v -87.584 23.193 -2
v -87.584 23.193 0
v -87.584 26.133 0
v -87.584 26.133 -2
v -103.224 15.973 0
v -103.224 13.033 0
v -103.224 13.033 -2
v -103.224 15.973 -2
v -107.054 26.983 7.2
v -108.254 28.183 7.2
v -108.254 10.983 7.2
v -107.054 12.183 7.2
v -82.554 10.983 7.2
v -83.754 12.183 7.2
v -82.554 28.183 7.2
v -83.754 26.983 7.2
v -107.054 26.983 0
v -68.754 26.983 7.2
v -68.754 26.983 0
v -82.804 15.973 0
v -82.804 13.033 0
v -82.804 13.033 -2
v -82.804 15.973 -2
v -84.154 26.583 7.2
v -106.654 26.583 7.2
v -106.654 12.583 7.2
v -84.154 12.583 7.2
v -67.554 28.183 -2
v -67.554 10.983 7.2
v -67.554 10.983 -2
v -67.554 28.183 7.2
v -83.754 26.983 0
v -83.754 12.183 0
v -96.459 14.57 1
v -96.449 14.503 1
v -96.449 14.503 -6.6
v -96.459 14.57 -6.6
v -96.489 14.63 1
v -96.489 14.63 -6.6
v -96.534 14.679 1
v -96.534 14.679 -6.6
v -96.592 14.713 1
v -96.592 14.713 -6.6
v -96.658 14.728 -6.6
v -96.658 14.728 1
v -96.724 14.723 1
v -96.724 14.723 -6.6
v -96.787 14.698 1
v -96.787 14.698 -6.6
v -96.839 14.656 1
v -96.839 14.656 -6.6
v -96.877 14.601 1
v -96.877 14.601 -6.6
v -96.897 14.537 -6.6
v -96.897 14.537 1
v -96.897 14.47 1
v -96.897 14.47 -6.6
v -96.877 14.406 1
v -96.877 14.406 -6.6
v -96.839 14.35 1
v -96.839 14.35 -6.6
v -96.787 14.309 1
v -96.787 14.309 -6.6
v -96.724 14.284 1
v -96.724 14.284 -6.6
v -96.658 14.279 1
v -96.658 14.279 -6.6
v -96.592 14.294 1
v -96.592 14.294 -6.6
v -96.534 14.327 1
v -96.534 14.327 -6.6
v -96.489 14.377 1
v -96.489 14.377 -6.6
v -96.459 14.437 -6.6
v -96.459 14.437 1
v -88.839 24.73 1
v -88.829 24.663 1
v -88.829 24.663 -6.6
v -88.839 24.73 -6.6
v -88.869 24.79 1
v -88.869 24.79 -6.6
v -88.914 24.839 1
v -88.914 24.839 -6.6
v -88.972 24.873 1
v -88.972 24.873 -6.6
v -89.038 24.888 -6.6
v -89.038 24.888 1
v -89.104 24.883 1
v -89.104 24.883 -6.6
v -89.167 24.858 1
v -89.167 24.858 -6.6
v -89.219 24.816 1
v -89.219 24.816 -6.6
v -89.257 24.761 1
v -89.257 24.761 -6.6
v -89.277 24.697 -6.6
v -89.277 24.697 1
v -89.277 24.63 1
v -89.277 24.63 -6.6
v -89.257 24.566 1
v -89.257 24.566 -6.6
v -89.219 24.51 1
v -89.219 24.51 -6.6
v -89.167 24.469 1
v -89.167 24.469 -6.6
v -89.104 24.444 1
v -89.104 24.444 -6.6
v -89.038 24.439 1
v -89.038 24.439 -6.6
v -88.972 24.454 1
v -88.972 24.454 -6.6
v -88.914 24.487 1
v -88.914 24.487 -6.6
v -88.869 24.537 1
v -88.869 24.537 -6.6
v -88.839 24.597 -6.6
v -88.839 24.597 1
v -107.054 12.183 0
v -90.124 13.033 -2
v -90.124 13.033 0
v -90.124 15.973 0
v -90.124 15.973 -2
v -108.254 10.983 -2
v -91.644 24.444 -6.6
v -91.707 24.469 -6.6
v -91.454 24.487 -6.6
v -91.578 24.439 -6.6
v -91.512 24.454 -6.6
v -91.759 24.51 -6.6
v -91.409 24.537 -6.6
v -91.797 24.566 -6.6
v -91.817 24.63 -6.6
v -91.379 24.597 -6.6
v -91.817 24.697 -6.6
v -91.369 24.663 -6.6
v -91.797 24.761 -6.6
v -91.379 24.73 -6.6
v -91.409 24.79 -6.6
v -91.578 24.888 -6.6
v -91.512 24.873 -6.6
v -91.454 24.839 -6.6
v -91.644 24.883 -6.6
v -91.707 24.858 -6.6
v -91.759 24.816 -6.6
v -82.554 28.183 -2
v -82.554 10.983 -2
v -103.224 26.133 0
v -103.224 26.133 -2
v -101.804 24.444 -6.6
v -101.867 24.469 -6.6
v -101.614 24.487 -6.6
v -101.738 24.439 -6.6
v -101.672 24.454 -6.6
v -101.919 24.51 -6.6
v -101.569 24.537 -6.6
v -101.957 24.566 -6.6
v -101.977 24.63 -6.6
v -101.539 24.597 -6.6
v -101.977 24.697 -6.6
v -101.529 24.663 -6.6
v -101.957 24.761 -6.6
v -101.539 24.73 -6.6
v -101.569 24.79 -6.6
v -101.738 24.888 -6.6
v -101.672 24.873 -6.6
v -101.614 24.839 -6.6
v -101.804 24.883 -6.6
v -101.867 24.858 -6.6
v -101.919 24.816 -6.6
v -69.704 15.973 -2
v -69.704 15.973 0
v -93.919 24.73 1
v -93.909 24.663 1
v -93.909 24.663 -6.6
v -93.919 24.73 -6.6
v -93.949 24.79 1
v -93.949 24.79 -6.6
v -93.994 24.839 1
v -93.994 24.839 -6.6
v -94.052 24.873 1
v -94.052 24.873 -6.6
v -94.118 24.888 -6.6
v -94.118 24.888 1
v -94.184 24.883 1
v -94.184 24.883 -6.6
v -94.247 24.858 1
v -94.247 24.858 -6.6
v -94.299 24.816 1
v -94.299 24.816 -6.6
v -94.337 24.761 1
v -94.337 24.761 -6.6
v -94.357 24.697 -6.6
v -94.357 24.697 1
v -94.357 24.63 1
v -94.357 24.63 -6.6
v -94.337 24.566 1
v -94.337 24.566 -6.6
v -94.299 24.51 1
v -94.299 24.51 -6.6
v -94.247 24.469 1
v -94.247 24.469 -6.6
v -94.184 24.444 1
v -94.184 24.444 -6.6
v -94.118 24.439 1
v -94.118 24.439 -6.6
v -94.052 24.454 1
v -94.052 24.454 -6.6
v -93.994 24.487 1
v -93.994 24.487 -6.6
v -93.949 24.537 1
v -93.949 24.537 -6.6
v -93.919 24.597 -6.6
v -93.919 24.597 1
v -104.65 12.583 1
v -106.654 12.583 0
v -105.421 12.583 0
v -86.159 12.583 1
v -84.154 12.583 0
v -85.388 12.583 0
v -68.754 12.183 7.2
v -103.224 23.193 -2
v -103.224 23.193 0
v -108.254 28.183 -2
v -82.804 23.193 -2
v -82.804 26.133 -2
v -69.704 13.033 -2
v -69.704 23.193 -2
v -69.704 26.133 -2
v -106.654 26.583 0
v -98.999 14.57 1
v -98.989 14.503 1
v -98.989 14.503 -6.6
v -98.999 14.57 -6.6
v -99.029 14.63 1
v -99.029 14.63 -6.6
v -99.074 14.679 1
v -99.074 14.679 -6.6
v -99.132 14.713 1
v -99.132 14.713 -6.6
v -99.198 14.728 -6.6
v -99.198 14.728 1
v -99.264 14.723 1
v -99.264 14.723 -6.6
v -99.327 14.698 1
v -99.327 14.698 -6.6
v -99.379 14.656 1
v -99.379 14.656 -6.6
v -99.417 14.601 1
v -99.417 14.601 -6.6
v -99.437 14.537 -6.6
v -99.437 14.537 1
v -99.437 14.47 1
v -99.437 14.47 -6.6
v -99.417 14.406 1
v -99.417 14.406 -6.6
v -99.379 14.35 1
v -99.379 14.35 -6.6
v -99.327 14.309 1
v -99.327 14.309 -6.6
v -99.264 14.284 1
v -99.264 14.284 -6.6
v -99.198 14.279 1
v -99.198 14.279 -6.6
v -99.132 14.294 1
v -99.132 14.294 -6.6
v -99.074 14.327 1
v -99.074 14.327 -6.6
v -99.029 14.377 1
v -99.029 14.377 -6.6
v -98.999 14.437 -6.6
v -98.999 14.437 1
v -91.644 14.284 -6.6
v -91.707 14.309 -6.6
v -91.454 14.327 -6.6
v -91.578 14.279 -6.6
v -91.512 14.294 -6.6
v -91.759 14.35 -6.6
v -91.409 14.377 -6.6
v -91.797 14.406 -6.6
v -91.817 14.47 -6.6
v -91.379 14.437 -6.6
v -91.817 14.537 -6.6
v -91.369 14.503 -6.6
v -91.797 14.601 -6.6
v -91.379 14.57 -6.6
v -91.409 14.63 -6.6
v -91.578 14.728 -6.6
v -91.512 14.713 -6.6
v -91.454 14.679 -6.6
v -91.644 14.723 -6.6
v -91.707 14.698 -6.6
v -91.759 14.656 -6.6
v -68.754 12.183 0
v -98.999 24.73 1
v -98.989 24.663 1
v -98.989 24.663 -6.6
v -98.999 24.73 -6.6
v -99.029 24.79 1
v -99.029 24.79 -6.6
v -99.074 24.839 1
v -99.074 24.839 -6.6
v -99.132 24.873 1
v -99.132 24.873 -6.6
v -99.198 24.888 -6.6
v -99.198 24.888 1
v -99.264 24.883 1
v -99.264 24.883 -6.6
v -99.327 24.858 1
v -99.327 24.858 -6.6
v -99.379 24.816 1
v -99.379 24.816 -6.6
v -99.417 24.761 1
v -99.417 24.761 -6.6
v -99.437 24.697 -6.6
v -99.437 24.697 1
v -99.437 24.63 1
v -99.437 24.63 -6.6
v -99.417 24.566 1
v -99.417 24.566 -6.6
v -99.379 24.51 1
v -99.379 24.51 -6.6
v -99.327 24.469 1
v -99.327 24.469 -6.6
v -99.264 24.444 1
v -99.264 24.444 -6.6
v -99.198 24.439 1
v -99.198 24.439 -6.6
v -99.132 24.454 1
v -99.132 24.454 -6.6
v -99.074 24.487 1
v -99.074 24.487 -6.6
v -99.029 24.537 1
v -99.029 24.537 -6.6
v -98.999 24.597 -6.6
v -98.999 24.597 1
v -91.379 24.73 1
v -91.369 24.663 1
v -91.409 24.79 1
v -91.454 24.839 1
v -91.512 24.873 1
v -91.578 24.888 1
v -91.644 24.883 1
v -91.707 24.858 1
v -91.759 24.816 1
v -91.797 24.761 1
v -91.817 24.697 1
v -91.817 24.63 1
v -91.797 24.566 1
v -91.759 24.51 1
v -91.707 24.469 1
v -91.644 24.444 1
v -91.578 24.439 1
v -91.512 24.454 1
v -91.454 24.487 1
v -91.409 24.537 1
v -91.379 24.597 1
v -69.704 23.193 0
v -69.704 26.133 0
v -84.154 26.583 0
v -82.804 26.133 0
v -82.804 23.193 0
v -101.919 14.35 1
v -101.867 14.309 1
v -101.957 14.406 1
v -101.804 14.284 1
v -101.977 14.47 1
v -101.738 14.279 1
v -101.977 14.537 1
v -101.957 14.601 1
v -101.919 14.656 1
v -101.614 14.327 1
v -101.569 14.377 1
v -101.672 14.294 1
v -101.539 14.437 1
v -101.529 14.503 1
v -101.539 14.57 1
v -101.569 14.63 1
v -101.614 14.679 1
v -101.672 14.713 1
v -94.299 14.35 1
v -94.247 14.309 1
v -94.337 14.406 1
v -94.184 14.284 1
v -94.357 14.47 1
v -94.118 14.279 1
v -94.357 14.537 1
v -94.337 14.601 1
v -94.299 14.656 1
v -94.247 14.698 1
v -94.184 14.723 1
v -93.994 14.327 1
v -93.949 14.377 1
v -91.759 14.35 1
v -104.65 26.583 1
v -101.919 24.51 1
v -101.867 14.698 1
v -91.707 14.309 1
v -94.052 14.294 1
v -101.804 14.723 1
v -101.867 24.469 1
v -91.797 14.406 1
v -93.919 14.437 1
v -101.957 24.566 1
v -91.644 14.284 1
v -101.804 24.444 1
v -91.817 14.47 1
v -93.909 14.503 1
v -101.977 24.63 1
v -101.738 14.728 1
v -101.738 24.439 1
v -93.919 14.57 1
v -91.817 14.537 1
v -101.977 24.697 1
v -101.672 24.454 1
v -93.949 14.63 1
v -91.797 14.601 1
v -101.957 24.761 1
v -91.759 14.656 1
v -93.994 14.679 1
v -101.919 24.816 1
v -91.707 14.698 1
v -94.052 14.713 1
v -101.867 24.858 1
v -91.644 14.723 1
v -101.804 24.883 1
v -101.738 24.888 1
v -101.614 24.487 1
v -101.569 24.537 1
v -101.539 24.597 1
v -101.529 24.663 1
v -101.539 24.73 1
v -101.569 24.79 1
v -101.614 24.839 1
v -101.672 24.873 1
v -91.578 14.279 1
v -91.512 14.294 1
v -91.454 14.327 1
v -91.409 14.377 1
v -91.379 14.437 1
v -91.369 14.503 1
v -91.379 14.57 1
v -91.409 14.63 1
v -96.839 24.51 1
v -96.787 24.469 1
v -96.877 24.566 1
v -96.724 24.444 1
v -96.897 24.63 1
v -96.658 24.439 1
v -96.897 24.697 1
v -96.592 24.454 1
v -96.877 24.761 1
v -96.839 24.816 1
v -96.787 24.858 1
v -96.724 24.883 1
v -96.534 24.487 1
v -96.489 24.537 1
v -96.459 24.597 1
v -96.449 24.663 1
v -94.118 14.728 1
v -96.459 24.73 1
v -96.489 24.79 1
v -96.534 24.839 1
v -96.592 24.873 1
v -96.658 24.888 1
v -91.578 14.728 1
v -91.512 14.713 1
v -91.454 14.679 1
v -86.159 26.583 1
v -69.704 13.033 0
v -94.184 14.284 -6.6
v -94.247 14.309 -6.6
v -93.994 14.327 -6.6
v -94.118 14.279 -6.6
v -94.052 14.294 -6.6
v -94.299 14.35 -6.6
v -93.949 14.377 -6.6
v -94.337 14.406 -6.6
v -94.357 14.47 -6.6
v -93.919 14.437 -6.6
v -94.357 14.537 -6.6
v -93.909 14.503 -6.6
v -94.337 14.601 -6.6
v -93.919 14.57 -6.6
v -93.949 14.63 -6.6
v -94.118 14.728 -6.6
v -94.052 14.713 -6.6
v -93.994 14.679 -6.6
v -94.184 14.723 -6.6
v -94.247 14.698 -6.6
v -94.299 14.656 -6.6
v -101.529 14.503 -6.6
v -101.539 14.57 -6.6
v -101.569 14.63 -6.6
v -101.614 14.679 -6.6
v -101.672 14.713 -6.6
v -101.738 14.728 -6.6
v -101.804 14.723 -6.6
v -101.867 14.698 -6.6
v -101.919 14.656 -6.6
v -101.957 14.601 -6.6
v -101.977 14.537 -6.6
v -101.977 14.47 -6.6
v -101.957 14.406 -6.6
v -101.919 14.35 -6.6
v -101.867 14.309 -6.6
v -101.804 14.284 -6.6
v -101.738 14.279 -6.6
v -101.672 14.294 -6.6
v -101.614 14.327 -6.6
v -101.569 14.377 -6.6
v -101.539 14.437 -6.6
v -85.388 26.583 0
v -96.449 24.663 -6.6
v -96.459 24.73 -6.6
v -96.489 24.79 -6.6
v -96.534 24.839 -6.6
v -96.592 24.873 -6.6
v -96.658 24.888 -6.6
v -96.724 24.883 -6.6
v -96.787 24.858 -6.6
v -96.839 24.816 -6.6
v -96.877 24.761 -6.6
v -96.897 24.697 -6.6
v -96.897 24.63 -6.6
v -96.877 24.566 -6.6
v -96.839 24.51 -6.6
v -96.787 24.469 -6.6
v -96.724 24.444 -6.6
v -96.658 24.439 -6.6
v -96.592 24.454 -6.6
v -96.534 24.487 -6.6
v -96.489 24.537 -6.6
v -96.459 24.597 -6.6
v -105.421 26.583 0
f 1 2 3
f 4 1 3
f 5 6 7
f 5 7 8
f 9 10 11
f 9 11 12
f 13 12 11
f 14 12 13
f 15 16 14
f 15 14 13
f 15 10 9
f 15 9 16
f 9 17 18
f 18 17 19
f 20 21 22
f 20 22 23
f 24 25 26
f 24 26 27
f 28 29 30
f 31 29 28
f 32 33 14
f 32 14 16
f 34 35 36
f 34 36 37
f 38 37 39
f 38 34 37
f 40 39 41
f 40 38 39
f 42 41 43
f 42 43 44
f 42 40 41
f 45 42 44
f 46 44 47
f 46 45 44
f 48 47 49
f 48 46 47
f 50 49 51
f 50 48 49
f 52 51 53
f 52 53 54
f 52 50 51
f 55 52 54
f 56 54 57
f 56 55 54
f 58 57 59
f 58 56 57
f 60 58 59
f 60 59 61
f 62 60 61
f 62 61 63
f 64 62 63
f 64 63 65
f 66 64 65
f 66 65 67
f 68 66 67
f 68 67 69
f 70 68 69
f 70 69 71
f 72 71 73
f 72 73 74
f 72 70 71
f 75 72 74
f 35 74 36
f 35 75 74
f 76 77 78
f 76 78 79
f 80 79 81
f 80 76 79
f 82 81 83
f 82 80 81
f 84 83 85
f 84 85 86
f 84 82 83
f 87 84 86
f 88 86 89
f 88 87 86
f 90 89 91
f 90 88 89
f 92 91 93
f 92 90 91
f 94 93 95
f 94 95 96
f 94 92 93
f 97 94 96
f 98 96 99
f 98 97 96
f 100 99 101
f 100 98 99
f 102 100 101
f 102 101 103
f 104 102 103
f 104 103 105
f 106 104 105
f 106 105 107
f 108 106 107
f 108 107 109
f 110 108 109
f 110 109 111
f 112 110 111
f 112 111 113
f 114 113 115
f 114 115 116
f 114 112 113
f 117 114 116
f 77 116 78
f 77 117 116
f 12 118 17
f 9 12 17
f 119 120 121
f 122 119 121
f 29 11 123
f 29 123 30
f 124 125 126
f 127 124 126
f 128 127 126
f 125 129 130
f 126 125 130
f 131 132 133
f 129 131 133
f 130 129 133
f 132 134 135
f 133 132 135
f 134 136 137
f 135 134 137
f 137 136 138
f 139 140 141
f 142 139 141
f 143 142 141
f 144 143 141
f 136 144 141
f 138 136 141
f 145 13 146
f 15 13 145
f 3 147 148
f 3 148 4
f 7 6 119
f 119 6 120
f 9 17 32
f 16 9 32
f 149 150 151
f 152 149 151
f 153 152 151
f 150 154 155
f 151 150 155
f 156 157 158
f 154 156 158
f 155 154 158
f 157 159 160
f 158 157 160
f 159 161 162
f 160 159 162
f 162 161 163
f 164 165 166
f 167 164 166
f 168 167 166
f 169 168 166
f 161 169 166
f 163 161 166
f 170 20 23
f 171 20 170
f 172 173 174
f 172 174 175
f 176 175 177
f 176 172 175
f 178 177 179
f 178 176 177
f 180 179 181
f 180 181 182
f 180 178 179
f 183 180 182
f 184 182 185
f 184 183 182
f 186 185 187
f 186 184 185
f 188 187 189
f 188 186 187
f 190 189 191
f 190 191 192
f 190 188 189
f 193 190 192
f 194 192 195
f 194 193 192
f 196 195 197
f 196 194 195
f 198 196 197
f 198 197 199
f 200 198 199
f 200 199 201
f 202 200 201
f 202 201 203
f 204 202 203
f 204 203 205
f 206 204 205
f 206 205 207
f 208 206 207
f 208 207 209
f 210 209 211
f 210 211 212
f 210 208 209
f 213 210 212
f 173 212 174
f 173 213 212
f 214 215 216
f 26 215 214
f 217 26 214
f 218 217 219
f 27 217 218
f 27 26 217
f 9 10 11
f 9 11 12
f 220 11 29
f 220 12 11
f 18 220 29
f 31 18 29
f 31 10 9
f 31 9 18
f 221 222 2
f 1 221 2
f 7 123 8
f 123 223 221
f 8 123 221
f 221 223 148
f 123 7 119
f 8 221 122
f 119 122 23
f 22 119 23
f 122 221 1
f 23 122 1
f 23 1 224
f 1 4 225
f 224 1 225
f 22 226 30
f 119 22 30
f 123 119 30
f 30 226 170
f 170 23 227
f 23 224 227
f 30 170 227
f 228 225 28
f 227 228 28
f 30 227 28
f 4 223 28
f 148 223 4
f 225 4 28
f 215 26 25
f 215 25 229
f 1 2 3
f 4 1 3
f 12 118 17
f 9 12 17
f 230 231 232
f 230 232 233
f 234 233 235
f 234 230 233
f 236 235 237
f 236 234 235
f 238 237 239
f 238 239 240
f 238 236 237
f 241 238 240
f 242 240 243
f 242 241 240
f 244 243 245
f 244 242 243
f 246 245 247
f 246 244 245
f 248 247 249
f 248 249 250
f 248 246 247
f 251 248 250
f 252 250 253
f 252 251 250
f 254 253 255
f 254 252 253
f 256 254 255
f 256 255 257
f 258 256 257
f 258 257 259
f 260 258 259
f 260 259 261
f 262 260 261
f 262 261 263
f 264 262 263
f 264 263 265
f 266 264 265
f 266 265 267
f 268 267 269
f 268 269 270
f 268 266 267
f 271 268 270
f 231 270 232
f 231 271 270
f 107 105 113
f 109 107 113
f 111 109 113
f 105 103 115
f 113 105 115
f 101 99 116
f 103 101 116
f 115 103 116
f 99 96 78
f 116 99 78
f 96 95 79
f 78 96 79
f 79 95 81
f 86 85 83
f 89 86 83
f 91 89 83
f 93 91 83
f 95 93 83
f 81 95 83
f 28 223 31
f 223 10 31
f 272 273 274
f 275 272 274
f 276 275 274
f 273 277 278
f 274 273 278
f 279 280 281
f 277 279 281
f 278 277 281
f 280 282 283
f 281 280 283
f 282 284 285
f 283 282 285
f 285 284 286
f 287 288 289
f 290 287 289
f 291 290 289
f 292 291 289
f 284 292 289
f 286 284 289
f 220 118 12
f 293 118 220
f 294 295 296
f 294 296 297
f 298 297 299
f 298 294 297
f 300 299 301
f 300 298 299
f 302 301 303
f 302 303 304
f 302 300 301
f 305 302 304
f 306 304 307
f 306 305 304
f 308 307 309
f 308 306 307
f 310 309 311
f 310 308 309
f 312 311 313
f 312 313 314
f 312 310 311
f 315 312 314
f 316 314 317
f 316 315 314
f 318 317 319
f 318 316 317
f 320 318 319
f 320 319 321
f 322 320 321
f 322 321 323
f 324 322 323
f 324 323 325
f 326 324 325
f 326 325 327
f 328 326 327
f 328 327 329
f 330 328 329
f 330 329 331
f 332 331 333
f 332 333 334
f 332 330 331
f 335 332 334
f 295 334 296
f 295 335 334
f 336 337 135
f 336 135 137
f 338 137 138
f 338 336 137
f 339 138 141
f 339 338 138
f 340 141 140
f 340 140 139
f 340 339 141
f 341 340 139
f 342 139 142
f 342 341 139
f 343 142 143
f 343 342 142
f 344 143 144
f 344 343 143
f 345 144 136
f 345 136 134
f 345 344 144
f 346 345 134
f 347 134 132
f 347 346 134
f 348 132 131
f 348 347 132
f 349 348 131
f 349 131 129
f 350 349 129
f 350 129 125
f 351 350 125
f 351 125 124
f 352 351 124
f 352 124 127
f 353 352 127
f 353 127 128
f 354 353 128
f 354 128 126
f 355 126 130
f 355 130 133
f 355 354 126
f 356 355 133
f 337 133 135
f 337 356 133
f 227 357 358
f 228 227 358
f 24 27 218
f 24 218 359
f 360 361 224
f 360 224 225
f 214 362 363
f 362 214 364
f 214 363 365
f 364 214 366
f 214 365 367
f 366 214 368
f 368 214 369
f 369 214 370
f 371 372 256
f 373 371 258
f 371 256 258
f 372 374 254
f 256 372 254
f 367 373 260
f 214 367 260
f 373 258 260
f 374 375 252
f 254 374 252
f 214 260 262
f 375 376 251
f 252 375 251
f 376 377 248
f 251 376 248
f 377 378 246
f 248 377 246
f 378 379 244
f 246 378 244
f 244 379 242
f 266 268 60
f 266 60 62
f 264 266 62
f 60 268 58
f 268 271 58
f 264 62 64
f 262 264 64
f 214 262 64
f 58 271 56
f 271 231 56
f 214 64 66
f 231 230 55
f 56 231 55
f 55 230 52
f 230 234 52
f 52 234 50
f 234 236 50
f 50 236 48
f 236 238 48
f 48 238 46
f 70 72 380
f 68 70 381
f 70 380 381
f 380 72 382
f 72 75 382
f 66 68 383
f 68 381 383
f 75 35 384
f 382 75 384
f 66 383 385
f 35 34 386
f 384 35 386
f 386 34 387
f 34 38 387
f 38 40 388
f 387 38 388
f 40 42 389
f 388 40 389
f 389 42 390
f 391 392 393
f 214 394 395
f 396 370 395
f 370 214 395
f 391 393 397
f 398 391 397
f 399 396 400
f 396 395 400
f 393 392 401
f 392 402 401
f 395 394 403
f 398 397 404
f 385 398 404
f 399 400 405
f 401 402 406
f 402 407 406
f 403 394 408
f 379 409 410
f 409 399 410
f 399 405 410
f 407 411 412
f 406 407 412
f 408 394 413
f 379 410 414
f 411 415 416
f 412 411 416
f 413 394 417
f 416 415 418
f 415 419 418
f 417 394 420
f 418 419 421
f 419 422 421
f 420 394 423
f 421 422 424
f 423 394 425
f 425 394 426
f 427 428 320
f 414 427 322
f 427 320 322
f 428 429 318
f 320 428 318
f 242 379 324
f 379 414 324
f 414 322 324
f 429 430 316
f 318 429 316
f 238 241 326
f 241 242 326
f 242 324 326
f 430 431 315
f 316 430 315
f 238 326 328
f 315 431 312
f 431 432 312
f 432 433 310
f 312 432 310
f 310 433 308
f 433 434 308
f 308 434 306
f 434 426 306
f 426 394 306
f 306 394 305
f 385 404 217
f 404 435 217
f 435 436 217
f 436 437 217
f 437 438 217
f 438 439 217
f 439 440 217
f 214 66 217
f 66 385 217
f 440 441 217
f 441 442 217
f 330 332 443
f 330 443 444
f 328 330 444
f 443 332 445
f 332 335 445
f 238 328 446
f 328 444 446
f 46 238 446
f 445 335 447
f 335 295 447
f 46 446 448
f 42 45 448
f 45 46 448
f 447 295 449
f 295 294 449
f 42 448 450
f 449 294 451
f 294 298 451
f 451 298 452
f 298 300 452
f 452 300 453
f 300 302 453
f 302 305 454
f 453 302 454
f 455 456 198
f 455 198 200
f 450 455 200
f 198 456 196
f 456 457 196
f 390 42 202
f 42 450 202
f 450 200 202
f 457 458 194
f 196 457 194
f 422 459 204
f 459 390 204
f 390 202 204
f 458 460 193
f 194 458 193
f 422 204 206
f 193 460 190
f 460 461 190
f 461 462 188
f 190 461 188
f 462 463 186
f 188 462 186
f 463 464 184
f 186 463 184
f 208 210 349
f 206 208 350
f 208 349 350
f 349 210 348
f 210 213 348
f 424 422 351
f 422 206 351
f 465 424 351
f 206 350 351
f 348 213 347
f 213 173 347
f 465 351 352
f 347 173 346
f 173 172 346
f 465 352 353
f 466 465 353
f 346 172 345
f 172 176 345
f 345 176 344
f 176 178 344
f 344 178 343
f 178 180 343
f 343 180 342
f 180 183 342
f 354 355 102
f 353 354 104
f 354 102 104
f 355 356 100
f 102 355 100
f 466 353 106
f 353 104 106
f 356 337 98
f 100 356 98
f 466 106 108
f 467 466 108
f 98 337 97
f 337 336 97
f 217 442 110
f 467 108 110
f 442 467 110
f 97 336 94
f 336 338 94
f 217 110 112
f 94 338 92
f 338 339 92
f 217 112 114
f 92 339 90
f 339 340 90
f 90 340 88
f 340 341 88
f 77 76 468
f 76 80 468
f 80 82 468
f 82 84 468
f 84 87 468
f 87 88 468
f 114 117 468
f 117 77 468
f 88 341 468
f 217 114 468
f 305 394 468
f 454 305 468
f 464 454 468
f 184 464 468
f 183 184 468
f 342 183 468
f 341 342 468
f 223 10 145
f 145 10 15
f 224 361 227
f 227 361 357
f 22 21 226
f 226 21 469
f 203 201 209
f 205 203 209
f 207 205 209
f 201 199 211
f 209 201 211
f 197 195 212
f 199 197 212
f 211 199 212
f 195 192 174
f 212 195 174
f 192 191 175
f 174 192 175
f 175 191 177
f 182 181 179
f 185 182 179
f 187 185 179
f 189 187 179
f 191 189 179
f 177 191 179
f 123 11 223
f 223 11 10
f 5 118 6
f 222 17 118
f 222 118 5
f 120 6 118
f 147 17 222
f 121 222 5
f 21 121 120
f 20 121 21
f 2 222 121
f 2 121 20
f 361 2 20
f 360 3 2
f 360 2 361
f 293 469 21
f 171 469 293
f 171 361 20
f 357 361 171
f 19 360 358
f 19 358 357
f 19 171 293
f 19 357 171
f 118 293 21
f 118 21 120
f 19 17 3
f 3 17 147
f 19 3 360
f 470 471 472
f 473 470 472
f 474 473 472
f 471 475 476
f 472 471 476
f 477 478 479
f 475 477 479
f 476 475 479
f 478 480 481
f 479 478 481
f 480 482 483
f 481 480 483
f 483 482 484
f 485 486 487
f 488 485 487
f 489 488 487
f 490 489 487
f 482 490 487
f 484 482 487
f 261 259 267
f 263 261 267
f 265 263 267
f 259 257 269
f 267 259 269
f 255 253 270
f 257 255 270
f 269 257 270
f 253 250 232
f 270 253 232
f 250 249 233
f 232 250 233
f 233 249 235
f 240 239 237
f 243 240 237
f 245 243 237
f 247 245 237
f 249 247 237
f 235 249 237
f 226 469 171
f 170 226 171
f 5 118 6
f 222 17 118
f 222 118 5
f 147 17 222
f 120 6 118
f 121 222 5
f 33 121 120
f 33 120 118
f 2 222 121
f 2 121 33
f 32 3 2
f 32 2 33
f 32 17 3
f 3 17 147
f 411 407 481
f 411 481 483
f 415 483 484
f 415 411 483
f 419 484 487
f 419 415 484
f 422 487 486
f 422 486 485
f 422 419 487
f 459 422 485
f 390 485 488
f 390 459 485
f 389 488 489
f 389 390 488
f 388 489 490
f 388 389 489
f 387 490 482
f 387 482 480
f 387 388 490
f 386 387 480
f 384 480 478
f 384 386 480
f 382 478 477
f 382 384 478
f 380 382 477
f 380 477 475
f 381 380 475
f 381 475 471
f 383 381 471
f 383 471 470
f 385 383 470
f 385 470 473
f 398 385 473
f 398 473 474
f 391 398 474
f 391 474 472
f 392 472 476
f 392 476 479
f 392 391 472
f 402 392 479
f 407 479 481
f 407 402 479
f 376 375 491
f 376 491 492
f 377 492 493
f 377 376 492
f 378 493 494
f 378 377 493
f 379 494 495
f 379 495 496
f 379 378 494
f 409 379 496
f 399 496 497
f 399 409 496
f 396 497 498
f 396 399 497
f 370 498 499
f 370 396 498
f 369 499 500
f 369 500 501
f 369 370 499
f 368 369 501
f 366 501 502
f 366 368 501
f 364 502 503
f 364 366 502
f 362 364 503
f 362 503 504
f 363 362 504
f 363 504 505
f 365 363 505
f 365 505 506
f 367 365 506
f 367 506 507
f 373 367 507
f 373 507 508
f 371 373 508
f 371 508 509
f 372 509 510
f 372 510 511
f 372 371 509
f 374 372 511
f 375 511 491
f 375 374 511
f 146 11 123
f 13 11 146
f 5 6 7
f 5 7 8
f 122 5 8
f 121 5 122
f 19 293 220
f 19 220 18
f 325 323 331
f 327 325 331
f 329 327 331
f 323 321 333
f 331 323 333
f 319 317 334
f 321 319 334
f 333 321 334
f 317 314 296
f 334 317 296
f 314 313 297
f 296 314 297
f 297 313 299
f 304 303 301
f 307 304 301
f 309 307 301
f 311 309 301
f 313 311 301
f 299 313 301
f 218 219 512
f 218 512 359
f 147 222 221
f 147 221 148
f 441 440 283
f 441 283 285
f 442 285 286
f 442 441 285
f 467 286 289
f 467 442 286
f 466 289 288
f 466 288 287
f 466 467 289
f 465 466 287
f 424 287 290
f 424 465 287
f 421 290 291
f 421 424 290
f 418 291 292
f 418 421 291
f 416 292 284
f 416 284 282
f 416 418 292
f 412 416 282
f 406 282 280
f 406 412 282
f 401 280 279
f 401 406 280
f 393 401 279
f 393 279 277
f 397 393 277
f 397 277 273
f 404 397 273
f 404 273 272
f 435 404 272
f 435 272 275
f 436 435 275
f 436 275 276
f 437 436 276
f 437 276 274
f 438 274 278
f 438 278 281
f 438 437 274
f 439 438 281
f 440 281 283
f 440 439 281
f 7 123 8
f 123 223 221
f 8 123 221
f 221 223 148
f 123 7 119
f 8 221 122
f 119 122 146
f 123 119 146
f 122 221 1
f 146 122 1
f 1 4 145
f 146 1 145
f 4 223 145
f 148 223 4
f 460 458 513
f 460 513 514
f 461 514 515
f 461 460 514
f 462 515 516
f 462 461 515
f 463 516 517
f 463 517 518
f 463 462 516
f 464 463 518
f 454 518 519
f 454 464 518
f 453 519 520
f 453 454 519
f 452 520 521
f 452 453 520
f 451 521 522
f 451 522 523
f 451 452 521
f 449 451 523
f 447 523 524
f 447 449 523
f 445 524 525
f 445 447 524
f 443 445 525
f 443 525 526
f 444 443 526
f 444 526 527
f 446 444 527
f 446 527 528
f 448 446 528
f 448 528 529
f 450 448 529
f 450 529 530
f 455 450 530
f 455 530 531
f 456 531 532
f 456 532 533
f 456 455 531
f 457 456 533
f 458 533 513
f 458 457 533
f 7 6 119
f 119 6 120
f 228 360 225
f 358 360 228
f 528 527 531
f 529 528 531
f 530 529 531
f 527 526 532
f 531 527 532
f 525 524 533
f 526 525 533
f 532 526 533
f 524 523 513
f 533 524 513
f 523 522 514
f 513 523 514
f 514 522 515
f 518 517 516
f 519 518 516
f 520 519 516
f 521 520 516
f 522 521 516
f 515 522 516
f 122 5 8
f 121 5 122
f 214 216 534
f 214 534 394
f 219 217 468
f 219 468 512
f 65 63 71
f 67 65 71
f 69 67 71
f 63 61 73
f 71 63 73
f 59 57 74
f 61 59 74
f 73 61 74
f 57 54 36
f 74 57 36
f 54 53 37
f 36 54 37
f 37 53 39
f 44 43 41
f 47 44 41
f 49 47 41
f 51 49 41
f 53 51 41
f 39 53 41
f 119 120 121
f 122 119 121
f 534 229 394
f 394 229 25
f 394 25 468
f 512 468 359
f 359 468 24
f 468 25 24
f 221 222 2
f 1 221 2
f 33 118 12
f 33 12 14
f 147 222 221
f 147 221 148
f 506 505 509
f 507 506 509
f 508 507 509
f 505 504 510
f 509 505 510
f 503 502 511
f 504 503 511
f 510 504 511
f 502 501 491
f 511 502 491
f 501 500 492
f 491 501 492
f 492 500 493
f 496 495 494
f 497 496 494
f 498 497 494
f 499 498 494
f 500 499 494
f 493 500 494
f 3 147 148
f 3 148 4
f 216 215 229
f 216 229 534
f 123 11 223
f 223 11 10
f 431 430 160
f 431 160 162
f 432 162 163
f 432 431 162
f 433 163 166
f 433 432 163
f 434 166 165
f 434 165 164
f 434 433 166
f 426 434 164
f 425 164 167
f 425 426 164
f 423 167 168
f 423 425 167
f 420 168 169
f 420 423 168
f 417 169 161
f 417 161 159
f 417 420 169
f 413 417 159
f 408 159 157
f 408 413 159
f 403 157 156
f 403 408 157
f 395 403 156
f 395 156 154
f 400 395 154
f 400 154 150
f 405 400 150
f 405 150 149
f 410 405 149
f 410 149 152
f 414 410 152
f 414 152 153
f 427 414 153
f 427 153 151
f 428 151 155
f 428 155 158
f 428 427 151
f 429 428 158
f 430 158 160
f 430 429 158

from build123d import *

# Parameters (mm, degrees)
F4_W      = 22.5
F4_H      = 14
F6_DEPTH  = 6.2
F5_R      = 0.225
F7_DEPTH  = 7.6
F10_DEPTH = 14
F11_W     = 25.7
F11_H     = 17.2
F11_W_2   = 23.3
F11_H_2   = 14.8
F12_DEPTH = 7.2
F11_W_3   = 13.1
F11_H_3   = 2.94
F11_W_4   = 15.64
F13_DEPTH = 2
F14_W     = 40.7
F14_H     = 17.2
F14_W_2   = 38.3
F14_H_2   = 14.8
F15_DEPTH = 7.2
F14_W_3   = 13.1
F14_H_3   = 2.94
F14_W_4   = 15.64
F16_DEPTH = 2


# Not quite as in the source:
# - a feature names something its author has since deleted; it is built from what else it names


with BuildPart() as f6:
    # F4 (on offset) → F6 (new body, through all)
    with BuildSketch(Plane.XY.offset(7.2)):
        with Locations((-95.4044193358, 19.5834040642)):
            Rectangle(F4_W, F4_H)
    extrude(amount=-F6_DEPTH)

    # F5 (on offset) → F7 (join, through all)
    with BuildSketch(Plane.XY.offset(1)):
        with Locations((-91.5944193358, 24.6634040642)):
            Circle(F5_R)
        with Locations((-94.1344193358, 24.6634040642)):
            Circle(F5_R)
        with Locations((-96.6744193358, 24.6634040642)):
            Circle(F5_R)
        with Locations((-99.2144193358, 24.6634040642)):
            Circle(F5_R)
        with Locations((-101.7544193358, 24.6634040642)):
            Circle(F5_R)
        with Locations((-101.7544193358, 14.5034040642)):
            Circle(F5_R)
        with Locations((-99.2144193358, 14.5034040642)):
            Circle(F5_R)
        with Locations((-96.6744193358, 14.5034040642)):
            Circle(F5_R)
        with Locations((-94.1344193358, 14.5034040642)):
            Circle(F5_R)
        with Locations((-91.5944193358, 14.5034040642)):
            Circle(F5_R)
        with Locations((-89.0544193358, 24.6634040642)):
            Circle(F5_R)
    extrude(amount=-F7_DEPTH)

    # F9 (on offset) → F10 (join, through all)
    with BuildSketch(Plane.XZ.offset(-12.5834040642)):
        Polygon((-104.6495500536, 1), (-106.6544193358, 1), (-106.6544193358, 0), (-105.420655343, 0), align=None)
        Polygon((-86.1592886181, 1), (-85.3881833286, 0), (-84.1544193358, 0), (-84.1544193358, 1), align=None)
    extrude(amount=-F10_DEPTH)


with BuildPart() as f12:
    # F11 (on offset) → F12 (new body, through all)
    with BuildSketch(Plane.XY):
        with Locations((-95.4044193358, 19.5834040642)):
            Rectangle(F11_W, F11_H)
        with Locations((-95.4044193358, 19.5834040642)):
            Rectangle(F11_W_2, F11_H_2, mode=Mode.SUBTRACT)
    extrude(amount=F12_DEPTH)

    # F11 (on offset) → F13 (join)
    with BuildSketch(Plane.XY):
        with Locations((-95.4044193358, 19.5834040642)):
            Rectangle(F11_W, F11_H)
        with Locations((-95.4044193358, 19.5834040642)):
            Rectangle(F11_W_2, F11_H_2, mode=Mode.SUBTRACT)
        with Locations((-95.4044193358, 19.5834040642)):
            Rectangle(F11_W_2, F11_H_2)
        with Locations((-96.6744193358, 14.5034040642)):
            Rectangle(F11_W_3, F11_H_3, mode=Mode.SUBTRACT)
        with Locations((-95.4044193358, 24.6634040642)):
            Rectangle(F11_W_4, F11_H_3, mode=Mode.SUBTRACT)
    extrude(amount=-F13_DEPTH)


with BuildPart() as f15:
    # F14 (on offset) → F15 (new body, through all)
    with BuildSketch(Plane.XY):
        with Locations((-87.9044193358, 19.5834040642)):
            Rectangle(F14_W, F14_H)
        with Locations((-87.9044193358, 19.5834040642)):
            Rectangle(F14_W_2, F14_H_2, mode=Mode.SUBTRACT)
    extrude(amount=F15_DEPTH)

    # F14 (on offset) → F16 (join)
    with BuildSketch(Plane.XY):
        with Locations((-87.9044193358, 19.5834040642)):
            Rectangle(F14_W, F14_H)
        with Locations((-87.9044193358, 19.5834040642)):
            Rectangle(F14_W_2, F14_H_2, mode=Mode.SUBTRACT)
        with Locations((-87.9044193358, 19.5834040642)):
            Rectangle(F14_W_2, F14_H_2)
        with Locations((-96.6744193358, 14.5034040642)):
            Rectangle(F14_W_3, F14_H_3, mode=Mode.SUBTRACT)
        with Locations((-76.2544193358, 14.5034040642)):
            Rectangle(F14_W_3, F14_H_3, mode=Mode.SUBTRACT)
        with Locations((-95.4044193358, 24.6634040642)):
            Rectangle(F14_W_4, F14_H_3, mode=Mode.SUBTRACT)
        with Locations((-76.2544193358, 24.6634040642)):
            Rectangle(F14_W_3, F14_H_3, mode=Mode.SUBTRACT)
    extrude(amount=-F16_DEPTH)


solid = Compound([f6.part, f12.part, f15.part])
